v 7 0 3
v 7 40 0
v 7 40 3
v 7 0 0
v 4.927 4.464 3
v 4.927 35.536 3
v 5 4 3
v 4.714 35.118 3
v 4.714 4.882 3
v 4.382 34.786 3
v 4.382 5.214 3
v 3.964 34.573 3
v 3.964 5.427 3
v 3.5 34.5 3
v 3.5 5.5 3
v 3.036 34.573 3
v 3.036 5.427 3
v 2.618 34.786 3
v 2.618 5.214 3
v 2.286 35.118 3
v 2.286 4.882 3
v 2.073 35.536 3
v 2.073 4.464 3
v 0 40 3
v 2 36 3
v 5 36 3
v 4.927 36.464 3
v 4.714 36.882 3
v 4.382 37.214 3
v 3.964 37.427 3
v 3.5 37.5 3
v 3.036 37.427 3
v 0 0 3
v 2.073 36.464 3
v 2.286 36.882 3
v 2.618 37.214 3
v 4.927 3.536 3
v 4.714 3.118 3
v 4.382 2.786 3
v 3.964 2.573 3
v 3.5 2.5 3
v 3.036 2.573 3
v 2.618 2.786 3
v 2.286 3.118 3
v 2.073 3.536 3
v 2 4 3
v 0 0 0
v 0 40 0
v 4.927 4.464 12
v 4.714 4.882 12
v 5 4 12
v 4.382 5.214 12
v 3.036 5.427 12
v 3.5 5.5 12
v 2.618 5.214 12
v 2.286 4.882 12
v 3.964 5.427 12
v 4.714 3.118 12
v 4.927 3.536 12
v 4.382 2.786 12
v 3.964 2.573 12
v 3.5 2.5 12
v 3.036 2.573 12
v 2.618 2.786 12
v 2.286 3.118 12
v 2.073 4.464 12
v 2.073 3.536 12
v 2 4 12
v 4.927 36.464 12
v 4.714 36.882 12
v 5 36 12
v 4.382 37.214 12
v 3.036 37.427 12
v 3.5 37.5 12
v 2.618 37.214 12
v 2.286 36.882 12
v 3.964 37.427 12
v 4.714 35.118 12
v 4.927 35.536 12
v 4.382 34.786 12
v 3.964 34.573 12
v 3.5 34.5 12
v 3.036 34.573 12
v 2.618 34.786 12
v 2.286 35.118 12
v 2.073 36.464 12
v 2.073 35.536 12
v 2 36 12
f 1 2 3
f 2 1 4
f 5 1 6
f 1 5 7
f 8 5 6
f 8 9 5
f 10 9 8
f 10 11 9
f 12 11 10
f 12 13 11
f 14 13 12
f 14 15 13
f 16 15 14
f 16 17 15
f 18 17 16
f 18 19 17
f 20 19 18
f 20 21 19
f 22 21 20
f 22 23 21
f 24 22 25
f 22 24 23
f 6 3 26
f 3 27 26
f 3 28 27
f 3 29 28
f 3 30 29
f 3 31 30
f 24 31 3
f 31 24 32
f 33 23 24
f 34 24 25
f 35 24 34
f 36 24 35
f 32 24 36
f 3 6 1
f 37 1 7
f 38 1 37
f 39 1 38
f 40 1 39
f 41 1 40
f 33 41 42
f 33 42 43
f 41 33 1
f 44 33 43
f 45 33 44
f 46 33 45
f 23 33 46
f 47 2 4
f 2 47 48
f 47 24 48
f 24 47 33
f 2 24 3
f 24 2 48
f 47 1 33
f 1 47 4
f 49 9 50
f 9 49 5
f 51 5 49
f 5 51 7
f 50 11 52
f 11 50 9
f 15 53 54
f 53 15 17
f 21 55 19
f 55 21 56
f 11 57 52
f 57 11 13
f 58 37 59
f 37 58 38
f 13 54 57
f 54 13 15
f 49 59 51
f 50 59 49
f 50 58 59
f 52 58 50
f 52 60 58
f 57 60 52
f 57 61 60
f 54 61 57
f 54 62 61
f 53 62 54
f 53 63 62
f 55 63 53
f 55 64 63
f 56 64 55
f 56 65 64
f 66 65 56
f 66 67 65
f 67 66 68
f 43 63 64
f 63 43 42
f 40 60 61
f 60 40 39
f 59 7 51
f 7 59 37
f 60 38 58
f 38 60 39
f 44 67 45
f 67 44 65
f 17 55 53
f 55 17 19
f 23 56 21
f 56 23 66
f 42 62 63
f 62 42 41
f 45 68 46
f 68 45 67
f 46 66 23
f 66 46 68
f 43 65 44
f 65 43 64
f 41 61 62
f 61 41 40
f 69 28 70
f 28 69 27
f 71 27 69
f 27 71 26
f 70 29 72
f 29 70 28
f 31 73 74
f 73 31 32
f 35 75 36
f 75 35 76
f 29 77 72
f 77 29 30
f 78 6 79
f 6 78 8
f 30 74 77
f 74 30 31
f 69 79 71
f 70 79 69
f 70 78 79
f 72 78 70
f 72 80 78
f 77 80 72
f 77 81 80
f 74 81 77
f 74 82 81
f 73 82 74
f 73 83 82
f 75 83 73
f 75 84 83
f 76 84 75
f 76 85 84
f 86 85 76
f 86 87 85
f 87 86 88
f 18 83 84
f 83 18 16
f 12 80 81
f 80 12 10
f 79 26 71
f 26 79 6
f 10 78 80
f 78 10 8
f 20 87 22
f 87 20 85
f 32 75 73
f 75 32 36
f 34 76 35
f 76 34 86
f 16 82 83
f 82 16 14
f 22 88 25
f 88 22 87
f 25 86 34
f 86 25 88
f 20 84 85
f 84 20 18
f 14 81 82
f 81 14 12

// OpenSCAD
plate_thickness = 3.00;
height=40.00;
locator_peg_diameter = 3.0;
locator_hole_position_y = 0.1;
locator_peg_height = 9.00;
plate_depth=7.00;
eps=0.001;

$fn=20;

cube([plate_depth, height, plate_thickness]);

translate([0.5*plate_depth, locator_hole_position_y*height, plate_thickness - eps])
    cylinder(d=locator_peg_diameter, h=locator_peg_height + eps);
    
translate([0.5*plate_depth, (1.0 - locator_hole_position_y)*height, plate_thickness - eps])
    cylinder(d=locator_peg_diameter, h=locator_peg_height + eps);
